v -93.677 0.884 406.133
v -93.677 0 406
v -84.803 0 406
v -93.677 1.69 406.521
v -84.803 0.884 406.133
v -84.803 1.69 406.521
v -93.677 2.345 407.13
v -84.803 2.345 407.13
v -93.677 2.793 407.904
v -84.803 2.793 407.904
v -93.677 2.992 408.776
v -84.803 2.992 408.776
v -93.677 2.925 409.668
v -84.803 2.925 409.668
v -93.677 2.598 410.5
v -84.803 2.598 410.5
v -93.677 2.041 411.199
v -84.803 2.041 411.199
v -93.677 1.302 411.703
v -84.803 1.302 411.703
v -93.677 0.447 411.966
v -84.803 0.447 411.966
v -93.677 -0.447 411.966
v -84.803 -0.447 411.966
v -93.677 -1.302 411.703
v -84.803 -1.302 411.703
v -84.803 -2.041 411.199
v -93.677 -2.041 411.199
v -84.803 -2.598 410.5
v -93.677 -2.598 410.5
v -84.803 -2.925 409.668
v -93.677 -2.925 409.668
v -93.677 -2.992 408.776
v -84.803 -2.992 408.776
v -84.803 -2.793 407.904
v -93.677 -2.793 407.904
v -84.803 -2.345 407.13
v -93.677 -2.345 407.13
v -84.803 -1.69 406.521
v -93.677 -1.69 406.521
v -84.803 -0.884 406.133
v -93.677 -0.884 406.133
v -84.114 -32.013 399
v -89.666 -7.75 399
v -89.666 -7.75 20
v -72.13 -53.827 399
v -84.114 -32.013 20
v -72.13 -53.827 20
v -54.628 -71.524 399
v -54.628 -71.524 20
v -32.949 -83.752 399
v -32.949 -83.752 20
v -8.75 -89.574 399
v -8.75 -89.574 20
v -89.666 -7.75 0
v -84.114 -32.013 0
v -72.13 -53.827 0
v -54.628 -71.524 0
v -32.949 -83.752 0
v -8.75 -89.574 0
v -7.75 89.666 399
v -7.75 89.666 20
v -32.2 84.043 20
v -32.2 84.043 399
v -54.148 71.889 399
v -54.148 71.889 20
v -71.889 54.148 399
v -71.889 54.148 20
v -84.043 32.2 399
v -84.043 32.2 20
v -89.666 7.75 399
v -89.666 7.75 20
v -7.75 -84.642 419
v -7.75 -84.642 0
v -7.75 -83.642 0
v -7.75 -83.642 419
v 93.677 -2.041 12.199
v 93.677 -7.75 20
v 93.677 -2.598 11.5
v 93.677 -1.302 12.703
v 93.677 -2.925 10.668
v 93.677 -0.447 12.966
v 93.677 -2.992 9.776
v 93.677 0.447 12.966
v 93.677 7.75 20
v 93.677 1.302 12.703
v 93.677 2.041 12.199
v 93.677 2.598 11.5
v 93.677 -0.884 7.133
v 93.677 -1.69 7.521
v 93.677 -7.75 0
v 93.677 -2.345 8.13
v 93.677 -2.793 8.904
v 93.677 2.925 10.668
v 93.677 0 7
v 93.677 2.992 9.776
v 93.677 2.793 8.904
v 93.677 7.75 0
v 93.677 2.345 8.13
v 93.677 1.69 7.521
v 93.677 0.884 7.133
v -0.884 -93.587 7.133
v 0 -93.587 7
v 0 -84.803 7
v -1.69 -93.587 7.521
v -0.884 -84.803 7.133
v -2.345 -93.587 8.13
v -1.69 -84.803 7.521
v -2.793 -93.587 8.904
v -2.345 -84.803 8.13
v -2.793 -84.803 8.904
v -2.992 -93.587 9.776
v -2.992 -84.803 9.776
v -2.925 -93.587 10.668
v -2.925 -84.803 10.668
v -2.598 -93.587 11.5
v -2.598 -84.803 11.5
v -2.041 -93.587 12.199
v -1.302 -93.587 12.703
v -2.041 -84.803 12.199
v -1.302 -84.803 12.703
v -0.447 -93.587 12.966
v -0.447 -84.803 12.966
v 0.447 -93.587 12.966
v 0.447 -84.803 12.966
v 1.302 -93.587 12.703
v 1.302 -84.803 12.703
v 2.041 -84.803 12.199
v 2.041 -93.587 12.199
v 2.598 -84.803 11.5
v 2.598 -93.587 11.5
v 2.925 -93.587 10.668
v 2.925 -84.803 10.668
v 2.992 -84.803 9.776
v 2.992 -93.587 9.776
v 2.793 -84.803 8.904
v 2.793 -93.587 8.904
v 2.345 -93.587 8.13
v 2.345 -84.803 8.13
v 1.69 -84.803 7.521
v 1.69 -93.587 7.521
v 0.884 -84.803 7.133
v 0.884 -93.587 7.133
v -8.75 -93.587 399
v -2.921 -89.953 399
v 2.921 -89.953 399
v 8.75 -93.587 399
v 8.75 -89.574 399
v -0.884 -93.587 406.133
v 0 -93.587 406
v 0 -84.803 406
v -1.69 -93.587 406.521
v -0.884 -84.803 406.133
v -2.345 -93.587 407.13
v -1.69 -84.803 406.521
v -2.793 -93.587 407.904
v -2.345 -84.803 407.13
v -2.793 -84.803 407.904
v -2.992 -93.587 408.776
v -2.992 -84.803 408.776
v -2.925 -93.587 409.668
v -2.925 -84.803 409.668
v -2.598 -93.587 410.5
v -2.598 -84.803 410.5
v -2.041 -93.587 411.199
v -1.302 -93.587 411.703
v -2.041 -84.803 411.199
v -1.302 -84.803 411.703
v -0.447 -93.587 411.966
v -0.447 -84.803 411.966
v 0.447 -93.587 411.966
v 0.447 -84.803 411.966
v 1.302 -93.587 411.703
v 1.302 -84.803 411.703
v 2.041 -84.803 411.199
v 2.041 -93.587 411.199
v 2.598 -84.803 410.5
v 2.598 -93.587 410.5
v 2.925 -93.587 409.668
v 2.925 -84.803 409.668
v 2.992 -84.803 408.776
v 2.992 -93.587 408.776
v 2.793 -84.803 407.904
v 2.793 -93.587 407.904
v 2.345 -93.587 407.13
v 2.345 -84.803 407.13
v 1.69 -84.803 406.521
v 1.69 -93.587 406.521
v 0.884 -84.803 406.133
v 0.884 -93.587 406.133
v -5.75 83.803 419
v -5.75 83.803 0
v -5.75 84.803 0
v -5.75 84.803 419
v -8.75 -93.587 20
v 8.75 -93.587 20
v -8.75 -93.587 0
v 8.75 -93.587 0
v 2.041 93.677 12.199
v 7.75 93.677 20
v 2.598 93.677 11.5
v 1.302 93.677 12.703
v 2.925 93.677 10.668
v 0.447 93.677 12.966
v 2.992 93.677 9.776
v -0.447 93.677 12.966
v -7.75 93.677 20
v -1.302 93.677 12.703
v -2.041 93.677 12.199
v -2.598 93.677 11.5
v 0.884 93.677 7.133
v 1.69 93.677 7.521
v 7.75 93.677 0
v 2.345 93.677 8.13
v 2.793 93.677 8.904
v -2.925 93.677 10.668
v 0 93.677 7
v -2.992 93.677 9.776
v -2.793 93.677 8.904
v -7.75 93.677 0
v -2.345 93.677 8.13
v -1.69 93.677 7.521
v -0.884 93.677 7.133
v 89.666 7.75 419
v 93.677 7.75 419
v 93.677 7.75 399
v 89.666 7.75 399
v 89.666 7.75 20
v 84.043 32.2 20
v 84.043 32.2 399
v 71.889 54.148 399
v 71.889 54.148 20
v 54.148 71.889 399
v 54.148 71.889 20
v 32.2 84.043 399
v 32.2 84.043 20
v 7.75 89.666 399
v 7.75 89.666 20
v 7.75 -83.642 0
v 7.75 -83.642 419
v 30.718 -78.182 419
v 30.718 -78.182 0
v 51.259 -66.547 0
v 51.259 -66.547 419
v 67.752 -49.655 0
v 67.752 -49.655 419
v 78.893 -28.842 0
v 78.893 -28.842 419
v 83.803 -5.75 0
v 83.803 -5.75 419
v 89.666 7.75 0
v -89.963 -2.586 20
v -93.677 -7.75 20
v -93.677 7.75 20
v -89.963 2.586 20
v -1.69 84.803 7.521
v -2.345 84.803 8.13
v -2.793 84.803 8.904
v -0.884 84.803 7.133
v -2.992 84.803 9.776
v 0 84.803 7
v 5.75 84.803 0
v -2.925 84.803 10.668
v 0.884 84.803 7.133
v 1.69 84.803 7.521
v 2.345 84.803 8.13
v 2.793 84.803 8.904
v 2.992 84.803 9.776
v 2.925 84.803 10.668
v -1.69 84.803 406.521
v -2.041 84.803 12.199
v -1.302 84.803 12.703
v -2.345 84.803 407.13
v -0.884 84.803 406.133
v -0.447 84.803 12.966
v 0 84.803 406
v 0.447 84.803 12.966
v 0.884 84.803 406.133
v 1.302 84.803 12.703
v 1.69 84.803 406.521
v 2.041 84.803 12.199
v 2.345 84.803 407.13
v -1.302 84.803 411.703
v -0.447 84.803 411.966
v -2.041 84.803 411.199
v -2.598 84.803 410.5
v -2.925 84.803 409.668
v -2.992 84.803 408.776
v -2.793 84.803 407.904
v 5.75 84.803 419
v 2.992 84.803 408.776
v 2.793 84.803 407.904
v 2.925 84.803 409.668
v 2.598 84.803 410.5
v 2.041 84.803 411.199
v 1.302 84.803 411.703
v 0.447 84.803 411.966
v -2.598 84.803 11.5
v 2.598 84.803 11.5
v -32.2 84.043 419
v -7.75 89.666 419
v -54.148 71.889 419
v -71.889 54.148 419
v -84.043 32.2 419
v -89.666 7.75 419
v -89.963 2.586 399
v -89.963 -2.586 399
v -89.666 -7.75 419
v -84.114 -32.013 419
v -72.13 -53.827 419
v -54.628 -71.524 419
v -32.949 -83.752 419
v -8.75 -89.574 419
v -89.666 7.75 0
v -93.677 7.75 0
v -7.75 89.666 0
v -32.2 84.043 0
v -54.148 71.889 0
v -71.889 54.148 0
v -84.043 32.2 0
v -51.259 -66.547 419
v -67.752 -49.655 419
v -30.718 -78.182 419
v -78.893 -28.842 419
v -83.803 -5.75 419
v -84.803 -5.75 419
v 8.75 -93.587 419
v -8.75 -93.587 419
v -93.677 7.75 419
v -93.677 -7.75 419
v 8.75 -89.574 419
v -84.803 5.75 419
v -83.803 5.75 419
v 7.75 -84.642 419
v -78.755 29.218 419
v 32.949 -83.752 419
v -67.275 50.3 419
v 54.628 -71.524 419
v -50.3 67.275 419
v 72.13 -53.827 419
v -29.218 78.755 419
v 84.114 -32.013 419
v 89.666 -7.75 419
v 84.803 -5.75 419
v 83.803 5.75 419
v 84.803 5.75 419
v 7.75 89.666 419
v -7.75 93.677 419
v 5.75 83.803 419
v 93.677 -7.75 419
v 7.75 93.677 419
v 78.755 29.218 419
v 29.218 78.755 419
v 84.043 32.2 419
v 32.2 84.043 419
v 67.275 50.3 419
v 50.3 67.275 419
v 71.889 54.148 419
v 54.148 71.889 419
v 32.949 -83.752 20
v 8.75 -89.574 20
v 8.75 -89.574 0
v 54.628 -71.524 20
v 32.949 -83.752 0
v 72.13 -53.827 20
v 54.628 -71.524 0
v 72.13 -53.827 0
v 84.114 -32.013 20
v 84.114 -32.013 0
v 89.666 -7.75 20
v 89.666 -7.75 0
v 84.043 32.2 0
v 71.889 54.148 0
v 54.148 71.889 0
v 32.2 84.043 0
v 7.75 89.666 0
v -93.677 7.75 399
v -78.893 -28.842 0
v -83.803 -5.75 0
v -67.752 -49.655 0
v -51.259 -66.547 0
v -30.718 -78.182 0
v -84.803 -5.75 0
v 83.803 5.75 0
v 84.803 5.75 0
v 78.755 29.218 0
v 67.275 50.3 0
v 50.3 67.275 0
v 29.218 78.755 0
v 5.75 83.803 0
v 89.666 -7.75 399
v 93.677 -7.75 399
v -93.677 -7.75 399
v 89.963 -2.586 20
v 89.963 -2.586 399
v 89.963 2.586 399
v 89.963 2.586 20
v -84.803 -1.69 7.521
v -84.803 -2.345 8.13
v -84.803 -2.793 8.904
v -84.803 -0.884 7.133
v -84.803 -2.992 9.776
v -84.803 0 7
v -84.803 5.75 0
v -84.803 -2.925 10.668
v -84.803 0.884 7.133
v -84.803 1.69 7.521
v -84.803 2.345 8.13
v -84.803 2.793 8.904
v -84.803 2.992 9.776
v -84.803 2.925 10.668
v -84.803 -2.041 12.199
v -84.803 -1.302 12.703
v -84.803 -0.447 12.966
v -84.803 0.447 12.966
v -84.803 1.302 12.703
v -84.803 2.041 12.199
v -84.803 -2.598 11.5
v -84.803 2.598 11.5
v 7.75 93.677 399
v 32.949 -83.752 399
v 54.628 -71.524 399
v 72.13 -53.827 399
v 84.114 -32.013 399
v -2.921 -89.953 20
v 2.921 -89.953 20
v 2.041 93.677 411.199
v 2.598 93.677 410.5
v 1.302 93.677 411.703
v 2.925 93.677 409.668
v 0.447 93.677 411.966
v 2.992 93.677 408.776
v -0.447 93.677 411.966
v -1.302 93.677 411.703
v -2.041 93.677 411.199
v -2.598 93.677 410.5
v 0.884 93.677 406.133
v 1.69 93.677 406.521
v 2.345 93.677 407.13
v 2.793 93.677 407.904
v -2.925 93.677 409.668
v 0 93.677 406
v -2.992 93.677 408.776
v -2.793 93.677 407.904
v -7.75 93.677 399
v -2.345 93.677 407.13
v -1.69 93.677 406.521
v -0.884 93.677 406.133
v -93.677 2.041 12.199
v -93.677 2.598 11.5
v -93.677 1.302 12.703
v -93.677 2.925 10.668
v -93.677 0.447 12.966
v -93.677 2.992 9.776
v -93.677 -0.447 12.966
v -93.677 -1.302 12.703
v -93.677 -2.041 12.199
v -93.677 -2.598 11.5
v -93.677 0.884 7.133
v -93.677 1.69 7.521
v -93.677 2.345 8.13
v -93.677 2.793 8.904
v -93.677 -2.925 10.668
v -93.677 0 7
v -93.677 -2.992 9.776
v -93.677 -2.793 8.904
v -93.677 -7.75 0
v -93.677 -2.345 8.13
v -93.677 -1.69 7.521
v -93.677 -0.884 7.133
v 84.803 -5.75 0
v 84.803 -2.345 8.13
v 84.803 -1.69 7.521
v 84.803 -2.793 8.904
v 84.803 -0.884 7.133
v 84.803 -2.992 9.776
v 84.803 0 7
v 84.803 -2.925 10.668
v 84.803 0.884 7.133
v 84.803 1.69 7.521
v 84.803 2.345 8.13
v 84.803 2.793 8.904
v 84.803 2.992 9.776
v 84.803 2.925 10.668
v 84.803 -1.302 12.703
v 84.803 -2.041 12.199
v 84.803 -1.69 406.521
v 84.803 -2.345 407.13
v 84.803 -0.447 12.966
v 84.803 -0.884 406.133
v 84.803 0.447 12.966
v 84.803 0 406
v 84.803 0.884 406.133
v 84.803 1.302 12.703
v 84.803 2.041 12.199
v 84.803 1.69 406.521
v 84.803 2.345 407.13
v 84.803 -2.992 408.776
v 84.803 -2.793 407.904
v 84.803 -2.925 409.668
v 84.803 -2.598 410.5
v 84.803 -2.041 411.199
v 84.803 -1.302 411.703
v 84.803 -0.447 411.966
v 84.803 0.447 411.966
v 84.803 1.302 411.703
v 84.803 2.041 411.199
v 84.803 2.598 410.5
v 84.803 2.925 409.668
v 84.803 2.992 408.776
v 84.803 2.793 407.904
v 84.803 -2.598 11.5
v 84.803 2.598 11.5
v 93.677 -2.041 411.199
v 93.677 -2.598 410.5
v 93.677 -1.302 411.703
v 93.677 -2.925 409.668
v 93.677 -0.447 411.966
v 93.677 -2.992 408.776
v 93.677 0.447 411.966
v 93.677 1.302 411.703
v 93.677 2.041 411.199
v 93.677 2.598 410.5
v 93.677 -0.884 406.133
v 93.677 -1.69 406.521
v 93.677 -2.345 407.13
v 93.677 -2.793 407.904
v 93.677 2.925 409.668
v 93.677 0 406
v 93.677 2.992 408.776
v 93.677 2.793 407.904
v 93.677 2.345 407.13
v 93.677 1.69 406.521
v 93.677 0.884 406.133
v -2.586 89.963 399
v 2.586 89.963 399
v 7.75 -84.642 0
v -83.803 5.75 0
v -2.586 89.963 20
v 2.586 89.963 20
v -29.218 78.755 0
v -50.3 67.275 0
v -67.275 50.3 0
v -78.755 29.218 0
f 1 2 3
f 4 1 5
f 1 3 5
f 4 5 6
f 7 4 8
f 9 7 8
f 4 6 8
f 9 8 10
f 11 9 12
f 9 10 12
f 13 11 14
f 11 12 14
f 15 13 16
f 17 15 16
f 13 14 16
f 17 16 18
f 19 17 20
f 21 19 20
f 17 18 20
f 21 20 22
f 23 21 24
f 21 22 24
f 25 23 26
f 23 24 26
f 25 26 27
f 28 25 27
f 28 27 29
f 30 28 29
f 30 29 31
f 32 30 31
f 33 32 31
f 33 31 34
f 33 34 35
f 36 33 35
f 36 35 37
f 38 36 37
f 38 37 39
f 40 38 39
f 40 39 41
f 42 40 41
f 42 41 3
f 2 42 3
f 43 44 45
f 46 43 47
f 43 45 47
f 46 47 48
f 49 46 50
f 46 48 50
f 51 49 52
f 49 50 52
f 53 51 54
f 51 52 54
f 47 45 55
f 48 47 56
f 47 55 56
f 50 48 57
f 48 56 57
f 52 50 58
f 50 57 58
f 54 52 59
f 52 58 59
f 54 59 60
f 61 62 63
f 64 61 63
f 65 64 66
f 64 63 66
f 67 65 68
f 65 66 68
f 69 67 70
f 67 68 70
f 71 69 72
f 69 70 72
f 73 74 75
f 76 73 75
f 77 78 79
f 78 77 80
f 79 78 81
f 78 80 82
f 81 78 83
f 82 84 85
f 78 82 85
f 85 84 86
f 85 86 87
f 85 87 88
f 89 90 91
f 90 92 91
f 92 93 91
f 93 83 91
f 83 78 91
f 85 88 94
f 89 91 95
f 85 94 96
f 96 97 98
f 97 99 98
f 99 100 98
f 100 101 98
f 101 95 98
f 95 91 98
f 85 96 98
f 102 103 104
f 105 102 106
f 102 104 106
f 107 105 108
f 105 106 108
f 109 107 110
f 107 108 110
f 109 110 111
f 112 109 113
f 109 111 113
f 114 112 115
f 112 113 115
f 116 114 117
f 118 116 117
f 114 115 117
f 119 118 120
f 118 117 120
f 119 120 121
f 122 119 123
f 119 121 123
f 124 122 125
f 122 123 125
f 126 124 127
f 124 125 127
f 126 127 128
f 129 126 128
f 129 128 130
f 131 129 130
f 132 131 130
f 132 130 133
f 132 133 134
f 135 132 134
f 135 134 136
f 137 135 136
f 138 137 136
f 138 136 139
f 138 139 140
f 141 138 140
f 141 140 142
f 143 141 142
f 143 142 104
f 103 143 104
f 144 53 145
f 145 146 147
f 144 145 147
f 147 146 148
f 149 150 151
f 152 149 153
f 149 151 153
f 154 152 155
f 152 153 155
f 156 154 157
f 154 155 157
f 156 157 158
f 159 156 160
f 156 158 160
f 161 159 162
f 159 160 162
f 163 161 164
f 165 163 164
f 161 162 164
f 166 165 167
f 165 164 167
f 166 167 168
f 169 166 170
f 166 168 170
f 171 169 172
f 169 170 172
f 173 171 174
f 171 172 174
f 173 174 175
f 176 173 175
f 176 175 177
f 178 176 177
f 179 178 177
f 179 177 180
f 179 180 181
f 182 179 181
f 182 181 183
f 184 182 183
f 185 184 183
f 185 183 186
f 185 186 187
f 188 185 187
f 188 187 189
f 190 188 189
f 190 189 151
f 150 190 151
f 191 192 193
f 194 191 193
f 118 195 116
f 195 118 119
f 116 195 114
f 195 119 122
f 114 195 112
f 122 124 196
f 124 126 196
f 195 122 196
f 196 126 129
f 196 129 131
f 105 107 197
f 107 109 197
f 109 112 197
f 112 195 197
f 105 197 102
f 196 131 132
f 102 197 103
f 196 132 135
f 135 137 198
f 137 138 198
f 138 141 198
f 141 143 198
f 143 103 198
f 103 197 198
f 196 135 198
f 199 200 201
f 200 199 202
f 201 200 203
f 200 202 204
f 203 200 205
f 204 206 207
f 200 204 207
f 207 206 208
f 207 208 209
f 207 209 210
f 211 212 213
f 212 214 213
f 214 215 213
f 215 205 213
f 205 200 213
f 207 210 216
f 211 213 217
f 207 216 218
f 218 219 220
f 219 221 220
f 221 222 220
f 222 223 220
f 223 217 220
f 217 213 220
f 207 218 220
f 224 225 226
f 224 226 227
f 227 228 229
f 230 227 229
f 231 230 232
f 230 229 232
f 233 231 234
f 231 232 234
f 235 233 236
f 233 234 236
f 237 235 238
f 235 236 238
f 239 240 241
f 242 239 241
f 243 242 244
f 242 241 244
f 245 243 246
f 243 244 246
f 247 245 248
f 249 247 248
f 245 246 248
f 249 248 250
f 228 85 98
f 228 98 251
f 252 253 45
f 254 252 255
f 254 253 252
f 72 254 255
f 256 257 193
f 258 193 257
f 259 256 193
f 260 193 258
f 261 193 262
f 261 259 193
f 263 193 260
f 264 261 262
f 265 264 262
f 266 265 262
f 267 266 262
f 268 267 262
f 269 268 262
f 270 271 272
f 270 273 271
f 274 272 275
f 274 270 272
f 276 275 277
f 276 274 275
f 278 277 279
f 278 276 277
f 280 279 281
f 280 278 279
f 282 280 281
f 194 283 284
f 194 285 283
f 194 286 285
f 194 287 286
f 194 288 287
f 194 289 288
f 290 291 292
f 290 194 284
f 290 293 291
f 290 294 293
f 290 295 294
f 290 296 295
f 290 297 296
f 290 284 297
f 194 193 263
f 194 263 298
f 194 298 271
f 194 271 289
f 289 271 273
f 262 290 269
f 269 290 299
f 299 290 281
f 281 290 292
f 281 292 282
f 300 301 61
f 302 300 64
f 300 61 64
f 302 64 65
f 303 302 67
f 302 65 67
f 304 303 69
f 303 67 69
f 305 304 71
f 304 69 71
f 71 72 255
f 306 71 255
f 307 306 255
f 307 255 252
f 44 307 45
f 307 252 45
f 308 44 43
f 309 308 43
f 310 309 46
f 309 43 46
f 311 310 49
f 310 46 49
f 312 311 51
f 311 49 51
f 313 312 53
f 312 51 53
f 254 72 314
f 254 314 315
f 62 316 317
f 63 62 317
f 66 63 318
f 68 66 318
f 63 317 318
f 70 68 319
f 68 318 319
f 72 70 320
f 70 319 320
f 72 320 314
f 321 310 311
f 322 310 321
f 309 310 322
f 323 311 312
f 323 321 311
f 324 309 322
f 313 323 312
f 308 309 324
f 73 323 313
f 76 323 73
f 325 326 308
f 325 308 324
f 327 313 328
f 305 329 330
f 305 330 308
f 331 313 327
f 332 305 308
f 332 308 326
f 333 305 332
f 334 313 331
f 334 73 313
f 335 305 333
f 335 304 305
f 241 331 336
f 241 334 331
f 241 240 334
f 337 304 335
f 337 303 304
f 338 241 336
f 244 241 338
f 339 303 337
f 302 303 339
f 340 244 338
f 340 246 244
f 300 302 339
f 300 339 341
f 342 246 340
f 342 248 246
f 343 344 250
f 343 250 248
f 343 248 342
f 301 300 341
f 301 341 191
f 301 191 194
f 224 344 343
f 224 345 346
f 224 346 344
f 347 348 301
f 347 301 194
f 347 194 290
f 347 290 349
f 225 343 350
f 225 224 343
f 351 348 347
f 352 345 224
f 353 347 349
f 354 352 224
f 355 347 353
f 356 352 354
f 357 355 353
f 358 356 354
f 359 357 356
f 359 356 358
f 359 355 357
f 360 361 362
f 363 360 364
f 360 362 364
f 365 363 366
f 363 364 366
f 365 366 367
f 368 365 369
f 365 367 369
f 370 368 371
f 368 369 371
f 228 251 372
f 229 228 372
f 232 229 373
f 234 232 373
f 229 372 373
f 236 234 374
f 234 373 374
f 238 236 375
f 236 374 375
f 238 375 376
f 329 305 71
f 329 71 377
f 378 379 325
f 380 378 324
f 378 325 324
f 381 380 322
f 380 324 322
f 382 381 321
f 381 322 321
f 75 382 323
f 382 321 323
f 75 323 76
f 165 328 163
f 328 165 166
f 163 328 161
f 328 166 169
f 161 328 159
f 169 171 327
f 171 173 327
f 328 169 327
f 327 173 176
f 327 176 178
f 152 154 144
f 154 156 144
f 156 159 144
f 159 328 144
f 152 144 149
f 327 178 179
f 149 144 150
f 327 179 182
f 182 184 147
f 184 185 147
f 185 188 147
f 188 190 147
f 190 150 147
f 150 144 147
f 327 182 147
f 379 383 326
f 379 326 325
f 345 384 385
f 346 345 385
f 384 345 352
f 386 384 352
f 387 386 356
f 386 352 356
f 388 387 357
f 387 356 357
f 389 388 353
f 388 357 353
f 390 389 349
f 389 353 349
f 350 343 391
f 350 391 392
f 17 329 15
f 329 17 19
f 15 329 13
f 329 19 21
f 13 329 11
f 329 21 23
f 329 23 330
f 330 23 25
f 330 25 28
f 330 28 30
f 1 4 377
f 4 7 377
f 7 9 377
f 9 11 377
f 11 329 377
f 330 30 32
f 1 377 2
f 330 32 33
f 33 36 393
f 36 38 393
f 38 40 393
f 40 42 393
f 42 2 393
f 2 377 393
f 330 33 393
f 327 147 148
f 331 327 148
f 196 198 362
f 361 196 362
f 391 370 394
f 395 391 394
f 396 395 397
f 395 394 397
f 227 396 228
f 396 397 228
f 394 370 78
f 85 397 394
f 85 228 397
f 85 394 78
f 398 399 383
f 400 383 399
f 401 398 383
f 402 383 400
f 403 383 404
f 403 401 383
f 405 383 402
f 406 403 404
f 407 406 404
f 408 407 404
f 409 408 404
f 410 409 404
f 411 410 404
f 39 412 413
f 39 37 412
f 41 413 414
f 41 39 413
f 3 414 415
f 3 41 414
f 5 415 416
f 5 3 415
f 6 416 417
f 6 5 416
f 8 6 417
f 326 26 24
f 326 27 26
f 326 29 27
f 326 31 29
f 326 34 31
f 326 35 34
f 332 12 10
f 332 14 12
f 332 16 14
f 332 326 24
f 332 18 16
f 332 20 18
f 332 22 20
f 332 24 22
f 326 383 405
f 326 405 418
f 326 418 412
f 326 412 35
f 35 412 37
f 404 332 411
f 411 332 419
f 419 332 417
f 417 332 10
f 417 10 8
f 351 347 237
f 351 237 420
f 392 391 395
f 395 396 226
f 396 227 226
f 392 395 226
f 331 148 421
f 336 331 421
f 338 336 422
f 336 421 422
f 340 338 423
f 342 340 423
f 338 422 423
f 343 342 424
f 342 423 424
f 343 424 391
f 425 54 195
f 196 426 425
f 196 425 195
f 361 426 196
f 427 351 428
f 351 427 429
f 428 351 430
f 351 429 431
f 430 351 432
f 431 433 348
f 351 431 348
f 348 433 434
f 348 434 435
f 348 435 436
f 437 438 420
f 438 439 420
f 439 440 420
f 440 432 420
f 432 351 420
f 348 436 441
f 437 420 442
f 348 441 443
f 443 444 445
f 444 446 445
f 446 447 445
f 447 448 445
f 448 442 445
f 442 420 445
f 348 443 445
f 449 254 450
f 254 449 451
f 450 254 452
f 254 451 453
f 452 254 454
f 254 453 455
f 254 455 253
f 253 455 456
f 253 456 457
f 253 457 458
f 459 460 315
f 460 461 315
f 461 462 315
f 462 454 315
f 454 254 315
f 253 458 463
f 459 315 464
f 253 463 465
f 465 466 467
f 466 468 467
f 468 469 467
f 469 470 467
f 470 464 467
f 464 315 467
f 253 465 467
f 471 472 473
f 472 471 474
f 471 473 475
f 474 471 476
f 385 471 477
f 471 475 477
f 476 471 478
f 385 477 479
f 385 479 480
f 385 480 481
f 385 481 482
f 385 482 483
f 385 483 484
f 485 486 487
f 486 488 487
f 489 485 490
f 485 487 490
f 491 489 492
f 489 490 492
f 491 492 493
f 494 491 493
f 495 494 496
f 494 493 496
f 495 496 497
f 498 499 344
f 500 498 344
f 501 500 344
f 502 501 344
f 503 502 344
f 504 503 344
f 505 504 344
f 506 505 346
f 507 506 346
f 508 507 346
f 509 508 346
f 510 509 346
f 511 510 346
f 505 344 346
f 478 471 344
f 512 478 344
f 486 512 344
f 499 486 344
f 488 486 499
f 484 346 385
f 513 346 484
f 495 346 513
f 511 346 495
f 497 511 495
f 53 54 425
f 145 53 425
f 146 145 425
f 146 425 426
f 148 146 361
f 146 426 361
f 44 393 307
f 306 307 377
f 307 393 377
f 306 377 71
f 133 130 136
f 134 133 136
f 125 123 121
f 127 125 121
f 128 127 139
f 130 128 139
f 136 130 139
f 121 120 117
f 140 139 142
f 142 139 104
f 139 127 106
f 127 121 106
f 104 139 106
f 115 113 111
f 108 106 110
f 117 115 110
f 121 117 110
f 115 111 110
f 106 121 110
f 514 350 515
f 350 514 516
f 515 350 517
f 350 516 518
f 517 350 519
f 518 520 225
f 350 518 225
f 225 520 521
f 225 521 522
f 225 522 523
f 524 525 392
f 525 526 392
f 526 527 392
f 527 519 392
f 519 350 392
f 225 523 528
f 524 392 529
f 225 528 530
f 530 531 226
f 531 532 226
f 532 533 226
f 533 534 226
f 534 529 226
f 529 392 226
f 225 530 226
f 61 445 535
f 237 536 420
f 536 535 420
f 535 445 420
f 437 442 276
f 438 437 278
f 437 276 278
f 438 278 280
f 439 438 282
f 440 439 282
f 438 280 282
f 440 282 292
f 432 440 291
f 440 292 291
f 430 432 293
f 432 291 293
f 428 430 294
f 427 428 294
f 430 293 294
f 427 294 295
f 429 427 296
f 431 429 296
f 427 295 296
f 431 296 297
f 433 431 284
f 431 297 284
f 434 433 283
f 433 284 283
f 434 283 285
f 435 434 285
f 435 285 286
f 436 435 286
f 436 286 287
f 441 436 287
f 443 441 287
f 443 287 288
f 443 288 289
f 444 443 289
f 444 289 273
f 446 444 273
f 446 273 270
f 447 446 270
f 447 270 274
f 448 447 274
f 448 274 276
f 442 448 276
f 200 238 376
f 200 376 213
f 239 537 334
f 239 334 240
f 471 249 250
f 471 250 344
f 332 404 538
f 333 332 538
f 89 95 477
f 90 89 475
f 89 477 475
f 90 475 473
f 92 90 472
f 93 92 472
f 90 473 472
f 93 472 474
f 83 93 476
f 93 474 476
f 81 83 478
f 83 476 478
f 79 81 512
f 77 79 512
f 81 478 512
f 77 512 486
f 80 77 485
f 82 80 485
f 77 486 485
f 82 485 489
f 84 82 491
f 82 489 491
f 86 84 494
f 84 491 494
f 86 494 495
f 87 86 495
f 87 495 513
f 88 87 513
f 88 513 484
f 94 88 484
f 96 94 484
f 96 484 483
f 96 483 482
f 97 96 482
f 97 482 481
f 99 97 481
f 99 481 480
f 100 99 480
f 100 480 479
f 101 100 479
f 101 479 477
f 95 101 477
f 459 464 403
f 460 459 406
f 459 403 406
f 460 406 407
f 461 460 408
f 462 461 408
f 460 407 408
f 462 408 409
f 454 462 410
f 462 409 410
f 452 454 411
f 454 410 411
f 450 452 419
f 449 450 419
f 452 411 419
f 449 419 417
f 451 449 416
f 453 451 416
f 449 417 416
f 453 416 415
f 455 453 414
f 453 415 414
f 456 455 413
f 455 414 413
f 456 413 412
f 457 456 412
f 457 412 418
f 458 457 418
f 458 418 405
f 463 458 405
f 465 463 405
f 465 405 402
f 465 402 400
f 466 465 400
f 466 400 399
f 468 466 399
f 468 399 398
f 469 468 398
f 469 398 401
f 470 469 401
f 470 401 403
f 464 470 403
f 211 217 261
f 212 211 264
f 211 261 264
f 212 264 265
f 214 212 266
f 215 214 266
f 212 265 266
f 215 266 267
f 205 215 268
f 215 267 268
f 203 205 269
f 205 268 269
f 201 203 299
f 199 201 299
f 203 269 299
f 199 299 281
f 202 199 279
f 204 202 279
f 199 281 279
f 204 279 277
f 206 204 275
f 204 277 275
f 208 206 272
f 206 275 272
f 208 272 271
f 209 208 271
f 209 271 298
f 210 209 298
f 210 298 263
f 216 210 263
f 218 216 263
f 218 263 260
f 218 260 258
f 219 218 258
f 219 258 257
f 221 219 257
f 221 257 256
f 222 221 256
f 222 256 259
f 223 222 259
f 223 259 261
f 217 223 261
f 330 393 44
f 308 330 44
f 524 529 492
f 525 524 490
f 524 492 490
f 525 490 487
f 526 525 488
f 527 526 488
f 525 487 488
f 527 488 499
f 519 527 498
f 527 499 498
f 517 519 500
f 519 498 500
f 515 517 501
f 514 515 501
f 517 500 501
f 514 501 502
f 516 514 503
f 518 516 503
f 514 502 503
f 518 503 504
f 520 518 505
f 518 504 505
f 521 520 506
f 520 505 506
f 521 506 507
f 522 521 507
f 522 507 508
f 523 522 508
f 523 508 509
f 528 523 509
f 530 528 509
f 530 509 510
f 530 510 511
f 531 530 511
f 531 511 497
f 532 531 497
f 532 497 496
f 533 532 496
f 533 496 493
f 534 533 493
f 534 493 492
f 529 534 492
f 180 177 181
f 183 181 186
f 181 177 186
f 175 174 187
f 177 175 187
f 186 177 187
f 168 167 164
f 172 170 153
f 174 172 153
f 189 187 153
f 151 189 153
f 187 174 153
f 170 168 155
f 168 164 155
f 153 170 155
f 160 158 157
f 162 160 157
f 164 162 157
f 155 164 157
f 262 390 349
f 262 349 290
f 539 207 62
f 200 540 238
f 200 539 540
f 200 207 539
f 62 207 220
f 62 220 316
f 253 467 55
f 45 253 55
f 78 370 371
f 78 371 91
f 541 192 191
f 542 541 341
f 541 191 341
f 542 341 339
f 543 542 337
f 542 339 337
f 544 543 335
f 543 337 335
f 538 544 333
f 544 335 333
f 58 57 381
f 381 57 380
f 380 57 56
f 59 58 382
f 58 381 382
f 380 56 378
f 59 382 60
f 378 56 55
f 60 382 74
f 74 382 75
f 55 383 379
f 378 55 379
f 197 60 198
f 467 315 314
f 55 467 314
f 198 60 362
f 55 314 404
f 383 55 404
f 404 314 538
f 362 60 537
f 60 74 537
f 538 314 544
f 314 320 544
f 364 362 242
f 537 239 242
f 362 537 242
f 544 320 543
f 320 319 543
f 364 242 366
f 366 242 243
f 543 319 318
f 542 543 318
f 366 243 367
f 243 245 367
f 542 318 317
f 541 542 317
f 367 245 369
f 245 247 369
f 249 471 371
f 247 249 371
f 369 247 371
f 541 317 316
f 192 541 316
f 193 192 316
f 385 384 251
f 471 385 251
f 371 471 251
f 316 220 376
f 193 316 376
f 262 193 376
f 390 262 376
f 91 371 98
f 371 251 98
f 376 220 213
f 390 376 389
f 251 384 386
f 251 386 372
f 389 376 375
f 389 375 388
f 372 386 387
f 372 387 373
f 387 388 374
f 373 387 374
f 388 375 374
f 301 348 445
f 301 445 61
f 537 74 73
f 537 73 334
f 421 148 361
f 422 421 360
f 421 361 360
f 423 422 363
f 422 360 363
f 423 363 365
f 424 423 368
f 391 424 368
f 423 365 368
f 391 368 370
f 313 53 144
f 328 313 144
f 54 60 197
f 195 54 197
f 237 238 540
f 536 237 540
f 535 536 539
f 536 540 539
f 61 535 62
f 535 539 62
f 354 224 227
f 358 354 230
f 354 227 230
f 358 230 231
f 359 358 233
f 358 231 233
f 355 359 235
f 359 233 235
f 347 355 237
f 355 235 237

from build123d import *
from build123d.topology import SkipClean

# Parameters (mm, degrees)
EXTRUDE_1_DEPTH          = 419
CUT_EXTRUDE_START        = -399
SKETCH_2_R               = 110
SKETCH_2_R_2             = 90
CUT_EXTRUDE_1_DEPTH      = 379
SKETCH_3_R               = 84
CUT_EXTRUDE_2_DEPTH      = 440.444628006
SKETCH_4_W               = 15.5
SKETCH_4_H               = 1
SKETCH_4_W_2             = 1
SKETCH_4_H_2             = 11.5
SKETCH_4_W_3             = 11.5
CUT_EXTRUDE_3_DEPTH      = 440.444628006
SKETCH_5_R               = 3
CUT_EXTRUDE_4_DEPTH      = 465.963674458
PATTERN_CIRCULAR_1_COUNT = 4


with BuildPart() as part:
    # 草图1 → 凸台-拉伸1 (new body)
    with BuildSketch(Plane.XY):
        with BuildLine():
            Line((-8.75, -89.573642887), (-8.75, -93.587458654))
            Line((-8.75, -93.587458654), (8.75, -93.587458654))
            Line((8.75, -93.587458654), (8.75, -89.573642887))
            ThreePointArc((8.75, -89.573642887), (63.993668164, -63.283571604), (89.66569857, -7.75))
            Line((89.66569857, -7.75), (93.676520759, -7.75))
            Line((93.676520759, -7.75), (93.676520759, 7.75))
            Line((93.676520759, 7.75), (89.66569857, 7.75))
            ThreePointArc((89.66569857, 7.75), (63.639610307, 63.639610307), (7.75, 89.66569857))
            Line((7.75, 89.66569857), (7.75, 93.676520759))
            Line((7.75, 93.676520759), (-7.75, 93.676520759))
            Line((-7.75, 93.676520759), (-7.75, 89.66569857))
            ThreePointArc((-7.75, 89.66569857), (-63.639610307, 63.639610307), (-89.66569857, 7.75))
            Line((-89.66569857, 7.75), (-93.676520759, 7.75))
            Line((-93.676520759, 7.75), (-93.676520759, -7.75))
            Line((-93.676520759, -7.75), (-89.66569857, -7.75))
            ThreePointArc((-89.66569857, -7.75), (-63.993668164, -63.283571604), (-8.75, -89.573642887))
        make_face()
    extrude(amount=EXTRUDE_1_DEPTH)

    # 草图2 → 切除-拉伸1 (cut)
    with SkipClean():  # the faces are left unmerged after this step: merging them gives an invalid solid
        with BuildSketch(Plane.XY.offset(419).offset(CUT_EXTRUDE_START)):
            Circle(SKETCH_2_R)
            with Locations(Location((0, 0, 0), (0, 0, 184.939921132))):
                Circle(SKETCH_2_R_2, mode=Mode.SUBTRACT)
        extrude(amount=CUT_EXTRUDE_1_DEPTH, mode=Mode.SUBTRACT)

    # 草图3 → 切除-拉伸2 (cut, through all)
    with SkipClean():  # the faces are left unmerged after this step: merging them gives an invalid solid
        with BuildSketch(Plane.XY.offset(419)):
            Circle(SKETCH_3_R)
        extrude(amount=-CUT_EXTRUDE_2_DEPTH, mode=Mode.SUBTRACT)

    # 草图4 → 切除-拉伸3 (cut, through all)
    with SkipClean():  # the faces are left unmerged after this step: merging them gives an invalid solid
        with BuildSketch(Plane.XY.offset(419)):
            with Locations((0, -84.141721049)):
                Rectangle(SKETCH_4_W, SKETCH_4_H)
            with Locations((-84.302968325, 0)):
                Rectangle(SKETCH_4_W_2, SKETCH_4_H_2)
            with Locations((0, 84.302968325)):
                Rectangle(SKETCH_4_W_3, SKETCH_4_H)
            with Locations((84.302968325, 0)):
                Rectangle(SKETCH_4_W_2, SKETCH_4_H_2)
        extrude(amount=-CUT_EXTRUDE_3_DEPTH, mode=Mode.SUBTRACT)

    # 草图5 → 切除-拉伸4 (cut, through all)
    with SkipClean():  # the faces are left unmerged after this step: merging them gives an invalid solid
        with BuildSketch(Plane(origin=(-84.802968325, 0, 0), x_dir=(0, 0, -1), z_dir=(1, 0, 0))):
            with Locations((-409, 0)):
                Circle(SKETCH_5_R)
            with Locations((-10, 0)):
                Circle(SKETCH_5_R)
        cut_extrude_4 = extrude(amount=-CUT_EXTRUDE_4_DEPTH, mode=Mode.SUBTRACT)

    # 阵列(圆周)1: 切除-拉伸4 ×4 about axis
    with SkipClean():  # the faces are left unmerged after this step: merging them gives an invalid solid
        pattern_circular_1_axis = Axis((0, 0, 1000), (0, 0, -1))
        for i in range(1, PATTERN_CIRCULAR_1_COUNT):
            add(cut_extrude_4.rotate(pattern_circular_1_axis, i * 360 / PATTERN_CIRCULAR_1_COUNT), mode=Mode.SUBTRACT)


solid = part.part
